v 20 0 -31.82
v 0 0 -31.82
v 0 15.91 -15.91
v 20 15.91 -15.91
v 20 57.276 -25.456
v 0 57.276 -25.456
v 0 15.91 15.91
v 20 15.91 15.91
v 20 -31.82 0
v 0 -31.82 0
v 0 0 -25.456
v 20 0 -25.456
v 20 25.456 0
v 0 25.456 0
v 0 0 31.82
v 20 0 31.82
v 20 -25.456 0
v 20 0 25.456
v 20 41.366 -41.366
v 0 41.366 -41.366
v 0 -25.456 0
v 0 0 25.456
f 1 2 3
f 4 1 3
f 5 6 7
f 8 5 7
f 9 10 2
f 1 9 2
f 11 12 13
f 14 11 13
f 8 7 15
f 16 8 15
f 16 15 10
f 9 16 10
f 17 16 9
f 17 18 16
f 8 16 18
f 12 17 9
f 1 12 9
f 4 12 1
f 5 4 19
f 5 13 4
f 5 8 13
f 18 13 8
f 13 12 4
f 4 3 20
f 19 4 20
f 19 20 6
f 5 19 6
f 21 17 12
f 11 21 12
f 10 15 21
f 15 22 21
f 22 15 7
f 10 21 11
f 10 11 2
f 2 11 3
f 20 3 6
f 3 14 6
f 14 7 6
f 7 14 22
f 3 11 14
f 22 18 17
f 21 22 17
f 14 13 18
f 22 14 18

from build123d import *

# Parameters (mm, degrees)
EXTRUDE_1_DEPTH     = 20
CUT_EXTRUDE_1_DEPTH = 20


with BuildPart() as part:
    # 草图2 → 凸台-拉伸1 (new body)
    with BuildSketch(Plane(origin=(0, 0, 0), x_dir=(0, 0, -1), z_dir=(1, 0, 0))):
        Polygon((0, -31.819805153), (31.819805153, 0), (15.909902577, 15.909902577), (41.365746699, 41.365746699), (25.455844123, 57.275649276), (-15.909902577, 15.909902577), (-31.819805153, 0), align=None)
    extrude(amount=EXTRUDE_1_DEPTH)

    # 草图3 → 切除-拉伸1 (cut)
    with BuildSketch(Plane(origin=(20, 0, 0), x_dir=(0, 0, -1), z_dir=(1, 0, 0))):
        Polygon((0, -25.455844123), (25.455844123, 0), (0, 25.455844123), (-25.455844123, 0), align=None)
    extrude(amount=-CUT_EXTRUDE_1_DEPTH, mode=Mode.SUBTRACT)


solid = part.part
